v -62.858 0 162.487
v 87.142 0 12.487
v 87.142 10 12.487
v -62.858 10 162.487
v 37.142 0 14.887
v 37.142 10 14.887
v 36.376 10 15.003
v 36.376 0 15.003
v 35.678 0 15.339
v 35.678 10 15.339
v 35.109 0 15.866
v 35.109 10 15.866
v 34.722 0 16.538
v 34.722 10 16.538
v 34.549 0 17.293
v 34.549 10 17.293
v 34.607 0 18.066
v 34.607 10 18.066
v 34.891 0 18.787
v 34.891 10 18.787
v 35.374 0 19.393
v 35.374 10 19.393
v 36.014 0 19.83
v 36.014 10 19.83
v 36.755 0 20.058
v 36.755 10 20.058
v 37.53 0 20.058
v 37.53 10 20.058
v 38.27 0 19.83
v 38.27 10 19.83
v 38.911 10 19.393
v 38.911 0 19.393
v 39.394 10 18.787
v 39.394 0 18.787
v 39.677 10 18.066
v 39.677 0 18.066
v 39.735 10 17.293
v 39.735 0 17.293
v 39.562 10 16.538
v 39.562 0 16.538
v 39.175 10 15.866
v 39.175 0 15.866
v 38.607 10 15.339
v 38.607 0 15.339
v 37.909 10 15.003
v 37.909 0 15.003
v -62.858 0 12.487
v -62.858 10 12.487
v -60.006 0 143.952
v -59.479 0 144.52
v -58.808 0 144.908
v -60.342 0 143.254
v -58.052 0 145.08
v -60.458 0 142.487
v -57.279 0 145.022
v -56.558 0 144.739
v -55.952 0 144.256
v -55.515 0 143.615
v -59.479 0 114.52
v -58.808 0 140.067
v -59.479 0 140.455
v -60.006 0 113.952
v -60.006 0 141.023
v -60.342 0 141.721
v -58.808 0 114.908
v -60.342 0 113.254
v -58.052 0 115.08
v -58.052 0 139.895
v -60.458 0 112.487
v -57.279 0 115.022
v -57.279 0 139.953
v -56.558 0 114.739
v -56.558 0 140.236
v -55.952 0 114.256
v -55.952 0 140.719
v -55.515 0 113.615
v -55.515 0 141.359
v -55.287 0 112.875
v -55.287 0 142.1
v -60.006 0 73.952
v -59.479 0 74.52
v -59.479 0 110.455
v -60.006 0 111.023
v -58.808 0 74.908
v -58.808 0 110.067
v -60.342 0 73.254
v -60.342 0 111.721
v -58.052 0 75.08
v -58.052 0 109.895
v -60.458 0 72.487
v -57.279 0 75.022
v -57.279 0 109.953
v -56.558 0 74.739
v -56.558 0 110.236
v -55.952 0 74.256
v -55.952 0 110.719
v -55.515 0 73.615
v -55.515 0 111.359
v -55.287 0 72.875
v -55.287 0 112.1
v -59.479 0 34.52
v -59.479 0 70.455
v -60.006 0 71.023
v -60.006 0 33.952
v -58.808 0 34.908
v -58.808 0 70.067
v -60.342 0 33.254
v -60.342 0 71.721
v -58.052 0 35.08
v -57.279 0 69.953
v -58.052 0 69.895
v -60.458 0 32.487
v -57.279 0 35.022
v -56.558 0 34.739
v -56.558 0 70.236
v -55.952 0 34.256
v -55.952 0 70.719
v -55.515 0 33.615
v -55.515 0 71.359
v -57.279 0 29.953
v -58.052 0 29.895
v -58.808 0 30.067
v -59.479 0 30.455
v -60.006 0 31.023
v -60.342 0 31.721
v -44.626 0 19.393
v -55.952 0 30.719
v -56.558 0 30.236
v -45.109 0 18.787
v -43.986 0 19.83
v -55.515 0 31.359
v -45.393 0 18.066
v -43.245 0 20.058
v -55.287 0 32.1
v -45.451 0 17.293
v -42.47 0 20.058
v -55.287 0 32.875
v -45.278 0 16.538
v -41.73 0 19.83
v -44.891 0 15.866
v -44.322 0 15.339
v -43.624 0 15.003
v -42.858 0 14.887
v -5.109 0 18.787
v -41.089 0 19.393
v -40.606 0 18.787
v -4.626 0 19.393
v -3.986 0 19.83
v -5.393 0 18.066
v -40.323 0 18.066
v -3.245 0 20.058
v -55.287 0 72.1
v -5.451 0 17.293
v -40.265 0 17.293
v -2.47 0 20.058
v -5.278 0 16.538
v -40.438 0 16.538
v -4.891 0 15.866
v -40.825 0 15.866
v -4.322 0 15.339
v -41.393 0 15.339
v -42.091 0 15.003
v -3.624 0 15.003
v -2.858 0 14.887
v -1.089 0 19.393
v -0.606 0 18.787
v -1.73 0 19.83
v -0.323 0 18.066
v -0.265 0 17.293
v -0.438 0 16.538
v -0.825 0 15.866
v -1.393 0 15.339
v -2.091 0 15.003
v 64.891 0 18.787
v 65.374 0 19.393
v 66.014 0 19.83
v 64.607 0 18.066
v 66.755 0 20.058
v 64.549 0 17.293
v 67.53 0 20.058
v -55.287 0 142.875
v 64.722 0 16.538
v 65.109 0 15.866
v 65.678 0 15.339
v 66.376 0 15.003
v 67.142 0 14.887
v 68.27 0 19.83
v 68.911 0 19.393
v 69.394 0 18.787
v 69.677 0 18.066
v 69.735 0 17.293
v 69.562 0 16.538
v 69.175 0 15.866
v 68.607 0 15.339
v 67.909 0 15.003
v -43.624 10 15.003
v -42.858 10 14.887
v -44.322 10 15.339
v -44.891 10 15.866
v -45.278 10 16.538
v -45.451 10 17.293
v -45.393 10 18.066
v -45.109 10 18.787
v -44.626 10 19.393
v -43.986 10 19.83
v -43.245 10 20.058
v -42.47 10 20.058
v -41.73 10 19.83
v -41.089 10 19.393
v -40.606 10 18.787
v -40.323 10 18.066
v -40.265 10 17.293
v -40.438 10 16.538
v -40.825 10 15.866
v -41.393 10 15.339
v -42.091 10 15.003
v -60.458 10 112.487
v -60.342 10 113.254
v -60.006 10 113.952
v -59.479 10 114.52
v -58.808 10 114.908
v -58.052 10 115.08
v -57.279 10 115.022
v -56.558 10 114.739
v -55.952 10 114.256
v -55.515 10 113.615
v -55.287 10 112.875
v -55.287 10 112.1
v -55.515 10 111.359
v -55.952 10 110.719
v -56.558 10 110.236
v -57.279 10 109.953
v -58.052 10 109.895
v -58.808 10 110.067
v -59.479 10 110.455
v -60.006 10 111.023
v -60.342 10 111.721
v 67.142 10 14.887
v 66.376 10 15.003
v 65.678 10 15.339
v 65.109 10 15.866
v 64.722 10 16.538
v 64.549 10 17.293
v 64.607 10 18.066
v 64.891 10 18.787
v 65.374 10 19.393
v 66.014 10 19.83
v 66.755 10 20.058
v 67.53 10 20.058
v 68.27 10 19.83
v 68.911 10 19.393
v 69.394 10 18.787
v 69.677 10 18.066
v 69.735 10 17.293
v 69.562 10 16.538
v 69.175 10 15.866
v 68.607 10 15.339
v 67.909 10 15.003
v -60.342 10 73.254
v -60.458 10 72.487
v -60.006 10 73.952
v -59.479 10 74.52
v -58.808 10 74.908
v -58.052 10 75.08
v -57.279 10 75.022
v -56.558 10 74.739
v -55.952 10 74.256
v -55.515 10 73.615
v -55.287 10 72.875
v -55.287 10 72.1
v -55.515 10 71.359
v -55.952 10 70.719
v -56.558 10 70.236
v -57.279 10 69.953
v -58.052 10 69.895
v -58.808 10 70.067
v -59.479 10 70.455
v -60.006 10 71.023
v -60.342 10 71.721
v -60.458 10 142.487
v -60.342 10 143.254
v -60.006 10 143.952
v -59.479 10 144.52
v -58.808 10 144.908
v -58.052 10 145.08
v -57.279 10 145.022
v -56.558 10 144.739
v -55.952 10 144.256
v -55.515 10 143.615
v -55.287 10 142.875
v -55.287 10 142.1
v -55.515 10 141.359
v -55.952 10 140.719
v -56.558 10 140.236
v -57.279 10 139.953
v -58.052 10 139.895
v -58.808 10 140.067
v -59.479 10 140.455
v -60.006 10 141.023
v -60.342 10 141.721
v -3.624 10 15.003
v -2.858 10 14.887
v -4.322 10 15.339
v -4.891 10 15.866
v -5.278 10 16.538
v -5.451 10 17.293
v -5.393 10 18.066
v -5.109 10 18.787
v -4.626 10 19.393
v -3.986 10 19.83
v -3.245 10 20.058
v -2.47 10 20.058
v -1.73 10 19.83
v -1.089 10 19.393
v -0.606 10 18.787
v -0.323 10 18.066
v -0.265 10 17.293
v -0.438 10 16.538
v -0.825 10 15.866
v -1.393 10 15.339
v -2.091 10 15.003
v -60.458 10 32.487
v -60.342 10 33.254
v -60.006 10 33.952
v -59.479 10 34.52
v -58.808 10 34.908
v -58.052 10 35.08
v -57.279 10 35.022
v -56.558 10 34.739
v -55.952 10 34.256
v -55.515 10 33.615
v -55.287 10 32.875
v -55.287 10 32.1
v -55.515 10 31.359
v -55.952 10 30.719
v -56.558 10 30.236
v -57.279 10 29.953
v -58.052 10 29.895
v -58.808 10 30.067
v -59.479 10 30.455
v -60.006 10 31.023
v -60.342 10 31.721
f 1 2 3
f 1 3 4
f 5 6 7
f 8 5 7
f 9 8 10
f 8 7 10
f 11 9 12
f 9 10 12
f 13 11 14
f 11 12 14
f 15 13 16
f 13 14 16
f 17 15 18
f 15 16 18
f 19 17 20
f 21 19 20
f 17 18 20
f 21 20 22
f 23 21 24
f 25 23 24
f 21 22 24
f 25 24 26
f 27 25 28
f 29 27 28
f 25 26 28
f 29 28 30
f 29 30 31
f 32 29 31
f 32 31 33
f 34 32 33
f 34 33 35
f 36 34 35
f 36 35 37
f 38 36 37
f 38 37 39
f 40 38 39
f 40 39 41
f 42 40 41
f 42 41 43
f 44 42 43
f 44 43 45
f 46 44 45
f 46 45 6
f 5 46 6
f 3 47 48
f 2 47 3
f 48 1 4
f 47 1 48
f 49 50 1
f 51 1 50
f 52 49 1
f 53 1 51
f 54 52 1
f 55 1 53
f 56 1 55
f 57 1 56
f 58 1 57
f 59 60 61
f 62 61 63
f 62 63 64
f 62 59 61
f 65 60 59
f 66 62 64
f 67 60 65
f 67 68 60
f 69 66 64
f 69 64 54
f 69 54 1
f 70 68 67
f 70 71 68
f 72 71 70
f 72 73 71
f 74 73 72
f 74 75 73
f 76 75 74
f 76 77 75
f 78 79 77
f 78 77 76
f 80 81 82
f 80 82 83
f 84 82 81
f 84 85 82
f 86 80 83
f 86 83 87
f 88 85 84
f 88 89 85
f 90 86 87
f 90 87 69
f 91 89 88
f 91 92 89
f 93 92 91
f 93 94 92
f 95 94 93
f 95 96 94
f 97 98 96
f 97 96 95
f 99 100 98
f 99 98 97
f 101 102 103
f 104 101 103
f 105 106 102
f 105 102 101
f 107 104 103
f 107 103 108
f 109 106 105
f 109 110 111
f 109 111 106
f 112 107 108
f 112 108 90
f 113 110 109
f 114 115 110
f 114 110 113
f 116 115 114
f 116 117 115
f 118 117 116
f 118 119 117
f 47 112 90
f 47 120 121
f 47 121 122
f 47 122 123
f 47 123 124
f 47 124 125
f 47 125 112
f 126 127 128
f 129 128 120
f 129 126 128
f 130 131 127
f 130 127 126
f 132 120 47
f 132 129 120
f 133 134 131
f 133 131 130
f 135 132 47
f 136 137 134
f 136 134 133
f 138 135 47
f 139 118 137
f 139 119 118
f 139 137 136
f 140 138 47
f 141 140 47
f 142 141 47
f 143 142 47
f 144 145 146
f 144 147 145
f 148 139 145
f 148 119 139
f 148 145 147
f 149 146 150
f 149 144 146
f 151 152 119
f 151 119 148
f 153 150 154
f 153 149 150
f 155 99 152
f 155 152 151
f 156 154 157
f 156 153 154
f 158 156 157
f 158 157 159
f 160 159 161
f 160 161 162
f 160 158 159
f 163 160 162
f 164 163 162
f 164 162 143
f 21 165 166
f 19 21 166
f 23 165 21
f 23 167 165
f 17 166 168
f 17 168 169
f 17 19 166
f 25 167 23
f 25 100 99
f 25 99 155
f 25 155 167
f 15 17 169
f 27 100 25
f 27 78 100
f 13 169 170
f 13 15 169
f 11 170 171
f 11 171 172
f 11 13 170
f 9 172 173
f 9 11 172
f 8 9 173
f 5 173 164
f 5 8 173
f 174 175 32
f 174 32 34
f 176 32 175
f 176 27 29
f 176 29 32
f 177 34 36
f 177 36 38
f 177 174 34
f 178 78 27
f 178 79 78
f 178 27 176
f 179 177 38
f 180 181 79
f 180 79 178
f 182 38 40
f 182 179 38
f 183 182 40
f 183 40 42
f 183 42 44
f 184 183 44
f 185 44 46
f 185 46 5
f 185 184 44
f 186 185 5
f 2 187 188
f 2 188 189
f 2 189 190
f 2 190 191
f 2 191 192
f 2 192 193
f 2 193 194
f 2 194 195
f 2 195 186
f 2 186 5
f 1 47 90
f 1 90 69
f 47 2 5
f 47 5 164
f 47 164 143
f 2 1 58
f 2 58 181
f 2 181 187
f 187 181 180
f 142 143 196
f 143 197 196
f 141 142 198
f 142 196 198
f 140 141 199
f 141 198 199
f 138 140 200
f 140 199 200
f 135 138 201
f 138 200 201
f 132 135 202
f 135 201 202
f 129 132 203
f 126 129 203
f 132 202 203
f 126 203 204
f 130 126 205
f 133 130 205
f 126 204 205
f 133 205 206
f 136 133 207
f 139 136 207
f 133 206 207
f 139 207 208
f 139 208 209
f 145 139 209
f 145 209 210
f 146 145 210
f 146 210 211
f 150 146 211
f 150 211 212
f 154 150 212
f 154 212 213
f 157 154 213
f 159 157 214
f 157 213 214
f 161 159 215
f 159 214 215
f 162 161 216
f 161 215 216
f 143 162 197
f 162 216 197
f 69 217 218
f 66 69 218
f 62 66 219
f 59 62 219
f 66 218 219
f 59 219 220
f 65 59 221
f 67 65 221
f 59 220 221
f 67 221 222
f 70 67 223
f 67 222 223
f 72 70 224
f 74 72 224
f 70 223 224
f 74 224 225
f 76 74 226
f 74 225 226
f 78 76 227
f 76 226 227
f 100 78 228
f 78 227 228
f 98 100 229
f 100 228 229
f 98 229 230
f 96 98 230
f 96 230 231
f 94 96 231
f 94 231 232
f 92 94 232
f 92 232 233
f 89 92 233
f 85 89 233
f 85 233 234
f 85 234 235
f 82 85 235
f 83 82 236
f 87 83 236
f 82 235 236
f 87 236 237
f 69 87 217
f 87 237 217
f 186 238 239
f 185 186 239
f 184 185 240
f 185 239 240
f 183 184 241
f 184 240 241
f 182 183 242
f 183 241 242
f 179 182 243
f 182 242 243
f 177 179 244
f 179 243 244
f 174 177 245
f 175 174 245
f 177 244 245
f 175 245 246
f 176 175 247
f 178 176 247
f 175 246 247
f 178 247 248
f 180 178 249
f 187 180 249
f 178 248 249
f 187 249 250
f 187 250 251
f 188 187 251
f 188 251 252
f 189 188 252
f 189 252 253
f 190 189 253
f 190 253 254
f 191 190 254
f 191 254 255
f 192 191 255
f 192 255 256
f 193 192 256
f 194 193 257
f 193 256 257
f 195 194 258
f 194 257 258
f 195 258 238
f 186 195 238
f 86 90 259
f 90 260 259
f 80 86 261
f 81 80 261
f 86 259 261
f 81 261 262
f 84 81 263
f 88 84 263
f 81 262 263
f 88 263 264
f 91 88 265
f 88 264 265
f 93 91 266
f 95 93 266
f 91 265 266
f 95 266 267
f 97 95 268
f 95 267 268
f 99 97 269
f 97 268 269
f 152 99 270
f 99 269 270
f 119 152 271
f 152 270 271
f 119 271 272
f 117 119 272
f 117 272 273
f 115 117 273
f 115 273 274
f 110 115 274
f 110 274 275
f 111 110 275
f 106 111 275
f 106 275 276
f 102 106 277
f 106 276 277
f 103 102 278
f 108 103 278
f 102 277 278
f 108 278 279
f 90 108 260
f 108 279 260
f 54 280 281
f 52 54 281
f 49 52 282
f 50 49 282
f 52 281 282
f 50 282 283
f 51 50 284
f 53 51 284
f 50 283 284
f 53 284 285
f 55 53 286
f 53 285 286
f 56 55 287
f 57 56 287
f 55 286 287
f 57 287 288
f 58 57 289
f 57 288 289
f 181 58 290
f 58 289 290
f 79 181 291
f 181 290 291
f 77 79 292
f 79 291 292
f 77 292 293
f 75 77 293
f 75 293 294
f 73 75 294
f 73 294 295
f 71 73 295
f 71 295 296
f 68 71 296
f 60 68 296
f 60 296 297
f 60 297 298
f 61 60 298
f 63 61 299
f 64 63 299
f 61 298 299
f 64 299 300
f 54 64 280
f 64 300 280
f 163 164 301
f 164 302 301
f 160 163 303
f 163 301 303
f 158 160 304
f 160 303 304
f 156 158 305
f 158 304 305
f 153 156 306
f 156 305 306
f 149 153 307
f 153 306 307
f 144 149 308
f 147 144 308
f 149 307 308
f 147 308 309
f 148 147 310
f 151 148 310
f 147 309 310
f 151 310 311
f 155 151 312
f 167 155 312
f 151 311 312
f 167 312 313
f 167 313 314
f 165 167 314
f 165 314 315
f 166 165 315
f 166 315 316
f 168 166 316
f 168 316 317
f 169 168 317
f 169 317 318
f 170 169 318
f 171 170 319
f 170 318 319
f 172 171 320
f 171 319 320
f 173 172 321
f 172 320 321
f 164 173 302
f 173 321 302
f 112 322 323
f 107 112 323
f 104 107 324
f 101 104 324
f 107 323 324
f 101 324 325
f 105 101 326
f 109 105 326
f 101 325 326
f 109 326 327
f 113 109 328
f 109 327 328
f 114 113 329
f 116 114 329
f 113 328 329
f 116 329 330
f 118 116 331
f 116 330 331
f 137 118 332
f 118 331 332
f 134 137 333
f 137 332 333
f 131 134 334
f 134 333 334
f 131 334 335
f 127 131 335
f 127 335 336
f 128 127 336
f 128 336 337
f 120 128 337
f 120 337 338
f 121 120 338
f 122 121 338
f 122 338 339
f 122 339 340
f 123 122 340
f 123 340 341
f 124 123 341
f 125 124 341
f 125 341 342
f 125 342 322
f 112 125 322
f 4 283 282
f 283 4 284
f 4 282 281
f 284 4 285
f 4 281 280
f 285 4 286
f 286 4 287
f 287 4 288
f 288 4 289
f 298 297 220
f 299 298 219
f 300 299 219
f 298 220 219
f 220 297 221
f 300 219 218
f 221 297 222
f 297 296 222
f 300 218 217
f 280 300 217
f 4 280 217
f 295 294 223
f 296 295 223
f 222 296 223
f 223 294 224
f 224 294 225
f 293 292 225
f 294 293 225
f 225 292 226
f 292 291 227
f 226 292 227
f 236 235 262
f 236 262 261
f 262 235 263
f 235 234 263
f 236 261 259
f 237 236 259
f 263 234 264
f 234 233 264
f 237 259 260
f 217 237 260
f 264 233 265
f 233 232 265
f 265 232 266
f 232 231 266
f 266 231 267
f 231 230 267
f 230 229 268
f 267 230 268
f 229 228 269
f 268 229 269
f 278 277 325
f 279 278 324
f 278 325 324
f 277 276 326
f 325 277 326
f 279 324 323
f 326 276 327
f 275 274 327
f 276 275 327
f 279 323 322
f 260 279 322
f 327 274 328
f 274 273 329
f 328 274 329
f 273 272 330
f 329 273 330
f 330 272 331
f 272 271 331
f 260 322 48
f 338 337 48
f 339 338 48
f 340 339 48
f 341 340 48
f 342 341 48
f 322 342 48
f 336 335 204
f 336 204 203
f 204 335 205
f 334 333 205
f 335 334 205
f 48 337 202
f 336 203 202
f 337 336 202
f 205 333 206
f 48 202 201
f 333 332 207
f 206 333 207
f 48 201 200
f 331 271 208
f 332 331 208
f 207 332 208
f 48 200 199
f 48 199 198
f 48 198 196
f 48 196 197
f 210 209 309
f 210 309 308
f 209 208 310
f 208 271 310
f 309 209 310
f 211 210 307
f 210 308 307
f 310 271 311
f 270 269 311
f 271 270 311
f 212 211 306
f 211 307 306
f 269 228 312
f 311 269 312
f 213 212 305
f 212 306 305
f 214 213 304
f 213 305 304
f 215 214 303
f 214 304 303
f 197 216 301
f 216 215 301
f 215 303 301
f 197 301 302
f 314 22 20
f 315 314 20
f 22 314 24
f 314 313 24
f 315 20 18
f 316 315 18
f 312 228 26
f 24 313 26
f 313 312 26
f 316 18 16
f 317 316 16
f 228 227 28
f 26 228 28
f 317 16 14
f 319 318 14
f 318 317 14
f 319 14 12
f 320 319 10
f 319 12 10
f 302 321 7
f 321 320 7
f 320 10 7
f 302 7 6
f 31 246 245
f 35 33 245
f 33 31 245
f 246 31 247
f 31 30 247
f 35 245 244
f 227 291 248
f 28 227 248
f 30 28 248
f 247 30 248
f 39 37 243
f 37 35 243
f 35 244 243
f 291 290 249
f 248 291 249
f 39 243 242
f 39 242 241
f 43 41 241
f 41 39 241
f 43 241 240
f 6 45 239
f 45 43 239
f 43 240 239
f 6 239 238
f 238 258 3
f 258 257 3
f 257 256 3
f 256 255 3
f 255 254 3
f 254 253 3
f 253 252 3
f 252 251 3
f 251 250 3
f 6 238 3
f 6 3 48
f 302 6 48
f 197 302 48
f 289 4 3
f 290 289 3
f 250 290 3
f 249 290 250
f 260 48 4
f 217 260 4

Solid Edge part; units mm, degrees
sketch "Sketch1" plane through (0, 0, 0) normal (0, -1, 0) x (1, 0, 0)
  line L0 (-62.8578, 12.4874) -> (87.1422, 12.4874)
  line L1 (87.1422, 12.4874) -> (-62.8578, 162.4874)
  line L2 (-62.8578, 162.4874) -> (-62.8578, 12.4874)
  dimension "D1" = 150
  dimension "D2" = 150
extrude "Protrusion1" add sketch "Sketch1" against normal blind 10
sketch "Sketch2" plane through (12.1422, 10, 87.4874) normal (0, 1, 0) x (-1, 0, 0)
  circle A0 centre (70, 25) radius 2.6
  circle A1 centre (70, -15) radius 2.6
  circle A2 centre (70, -55) radius 2.6
  circle A3 centre (70, 55) radius 2.6
  dimension "D1" = 30
  dimension "D2" = 5.2
  dimension "D3" = 5.2
  dimension "D4" = 5.2
  dimension "D5" = 5.2
  dimension "D6" = 40
  dimension "D7" = 40
  dimension "D8" = 20
  dimension "D9" = 5
extrude "Cutout1" cut sketch "Sketch2" against normal through all
mirror "Mirror1" about plane through (-9.8248, 5, 65.5204) normal (-0.7071, 0, 0.7071) of "Cutout1"
